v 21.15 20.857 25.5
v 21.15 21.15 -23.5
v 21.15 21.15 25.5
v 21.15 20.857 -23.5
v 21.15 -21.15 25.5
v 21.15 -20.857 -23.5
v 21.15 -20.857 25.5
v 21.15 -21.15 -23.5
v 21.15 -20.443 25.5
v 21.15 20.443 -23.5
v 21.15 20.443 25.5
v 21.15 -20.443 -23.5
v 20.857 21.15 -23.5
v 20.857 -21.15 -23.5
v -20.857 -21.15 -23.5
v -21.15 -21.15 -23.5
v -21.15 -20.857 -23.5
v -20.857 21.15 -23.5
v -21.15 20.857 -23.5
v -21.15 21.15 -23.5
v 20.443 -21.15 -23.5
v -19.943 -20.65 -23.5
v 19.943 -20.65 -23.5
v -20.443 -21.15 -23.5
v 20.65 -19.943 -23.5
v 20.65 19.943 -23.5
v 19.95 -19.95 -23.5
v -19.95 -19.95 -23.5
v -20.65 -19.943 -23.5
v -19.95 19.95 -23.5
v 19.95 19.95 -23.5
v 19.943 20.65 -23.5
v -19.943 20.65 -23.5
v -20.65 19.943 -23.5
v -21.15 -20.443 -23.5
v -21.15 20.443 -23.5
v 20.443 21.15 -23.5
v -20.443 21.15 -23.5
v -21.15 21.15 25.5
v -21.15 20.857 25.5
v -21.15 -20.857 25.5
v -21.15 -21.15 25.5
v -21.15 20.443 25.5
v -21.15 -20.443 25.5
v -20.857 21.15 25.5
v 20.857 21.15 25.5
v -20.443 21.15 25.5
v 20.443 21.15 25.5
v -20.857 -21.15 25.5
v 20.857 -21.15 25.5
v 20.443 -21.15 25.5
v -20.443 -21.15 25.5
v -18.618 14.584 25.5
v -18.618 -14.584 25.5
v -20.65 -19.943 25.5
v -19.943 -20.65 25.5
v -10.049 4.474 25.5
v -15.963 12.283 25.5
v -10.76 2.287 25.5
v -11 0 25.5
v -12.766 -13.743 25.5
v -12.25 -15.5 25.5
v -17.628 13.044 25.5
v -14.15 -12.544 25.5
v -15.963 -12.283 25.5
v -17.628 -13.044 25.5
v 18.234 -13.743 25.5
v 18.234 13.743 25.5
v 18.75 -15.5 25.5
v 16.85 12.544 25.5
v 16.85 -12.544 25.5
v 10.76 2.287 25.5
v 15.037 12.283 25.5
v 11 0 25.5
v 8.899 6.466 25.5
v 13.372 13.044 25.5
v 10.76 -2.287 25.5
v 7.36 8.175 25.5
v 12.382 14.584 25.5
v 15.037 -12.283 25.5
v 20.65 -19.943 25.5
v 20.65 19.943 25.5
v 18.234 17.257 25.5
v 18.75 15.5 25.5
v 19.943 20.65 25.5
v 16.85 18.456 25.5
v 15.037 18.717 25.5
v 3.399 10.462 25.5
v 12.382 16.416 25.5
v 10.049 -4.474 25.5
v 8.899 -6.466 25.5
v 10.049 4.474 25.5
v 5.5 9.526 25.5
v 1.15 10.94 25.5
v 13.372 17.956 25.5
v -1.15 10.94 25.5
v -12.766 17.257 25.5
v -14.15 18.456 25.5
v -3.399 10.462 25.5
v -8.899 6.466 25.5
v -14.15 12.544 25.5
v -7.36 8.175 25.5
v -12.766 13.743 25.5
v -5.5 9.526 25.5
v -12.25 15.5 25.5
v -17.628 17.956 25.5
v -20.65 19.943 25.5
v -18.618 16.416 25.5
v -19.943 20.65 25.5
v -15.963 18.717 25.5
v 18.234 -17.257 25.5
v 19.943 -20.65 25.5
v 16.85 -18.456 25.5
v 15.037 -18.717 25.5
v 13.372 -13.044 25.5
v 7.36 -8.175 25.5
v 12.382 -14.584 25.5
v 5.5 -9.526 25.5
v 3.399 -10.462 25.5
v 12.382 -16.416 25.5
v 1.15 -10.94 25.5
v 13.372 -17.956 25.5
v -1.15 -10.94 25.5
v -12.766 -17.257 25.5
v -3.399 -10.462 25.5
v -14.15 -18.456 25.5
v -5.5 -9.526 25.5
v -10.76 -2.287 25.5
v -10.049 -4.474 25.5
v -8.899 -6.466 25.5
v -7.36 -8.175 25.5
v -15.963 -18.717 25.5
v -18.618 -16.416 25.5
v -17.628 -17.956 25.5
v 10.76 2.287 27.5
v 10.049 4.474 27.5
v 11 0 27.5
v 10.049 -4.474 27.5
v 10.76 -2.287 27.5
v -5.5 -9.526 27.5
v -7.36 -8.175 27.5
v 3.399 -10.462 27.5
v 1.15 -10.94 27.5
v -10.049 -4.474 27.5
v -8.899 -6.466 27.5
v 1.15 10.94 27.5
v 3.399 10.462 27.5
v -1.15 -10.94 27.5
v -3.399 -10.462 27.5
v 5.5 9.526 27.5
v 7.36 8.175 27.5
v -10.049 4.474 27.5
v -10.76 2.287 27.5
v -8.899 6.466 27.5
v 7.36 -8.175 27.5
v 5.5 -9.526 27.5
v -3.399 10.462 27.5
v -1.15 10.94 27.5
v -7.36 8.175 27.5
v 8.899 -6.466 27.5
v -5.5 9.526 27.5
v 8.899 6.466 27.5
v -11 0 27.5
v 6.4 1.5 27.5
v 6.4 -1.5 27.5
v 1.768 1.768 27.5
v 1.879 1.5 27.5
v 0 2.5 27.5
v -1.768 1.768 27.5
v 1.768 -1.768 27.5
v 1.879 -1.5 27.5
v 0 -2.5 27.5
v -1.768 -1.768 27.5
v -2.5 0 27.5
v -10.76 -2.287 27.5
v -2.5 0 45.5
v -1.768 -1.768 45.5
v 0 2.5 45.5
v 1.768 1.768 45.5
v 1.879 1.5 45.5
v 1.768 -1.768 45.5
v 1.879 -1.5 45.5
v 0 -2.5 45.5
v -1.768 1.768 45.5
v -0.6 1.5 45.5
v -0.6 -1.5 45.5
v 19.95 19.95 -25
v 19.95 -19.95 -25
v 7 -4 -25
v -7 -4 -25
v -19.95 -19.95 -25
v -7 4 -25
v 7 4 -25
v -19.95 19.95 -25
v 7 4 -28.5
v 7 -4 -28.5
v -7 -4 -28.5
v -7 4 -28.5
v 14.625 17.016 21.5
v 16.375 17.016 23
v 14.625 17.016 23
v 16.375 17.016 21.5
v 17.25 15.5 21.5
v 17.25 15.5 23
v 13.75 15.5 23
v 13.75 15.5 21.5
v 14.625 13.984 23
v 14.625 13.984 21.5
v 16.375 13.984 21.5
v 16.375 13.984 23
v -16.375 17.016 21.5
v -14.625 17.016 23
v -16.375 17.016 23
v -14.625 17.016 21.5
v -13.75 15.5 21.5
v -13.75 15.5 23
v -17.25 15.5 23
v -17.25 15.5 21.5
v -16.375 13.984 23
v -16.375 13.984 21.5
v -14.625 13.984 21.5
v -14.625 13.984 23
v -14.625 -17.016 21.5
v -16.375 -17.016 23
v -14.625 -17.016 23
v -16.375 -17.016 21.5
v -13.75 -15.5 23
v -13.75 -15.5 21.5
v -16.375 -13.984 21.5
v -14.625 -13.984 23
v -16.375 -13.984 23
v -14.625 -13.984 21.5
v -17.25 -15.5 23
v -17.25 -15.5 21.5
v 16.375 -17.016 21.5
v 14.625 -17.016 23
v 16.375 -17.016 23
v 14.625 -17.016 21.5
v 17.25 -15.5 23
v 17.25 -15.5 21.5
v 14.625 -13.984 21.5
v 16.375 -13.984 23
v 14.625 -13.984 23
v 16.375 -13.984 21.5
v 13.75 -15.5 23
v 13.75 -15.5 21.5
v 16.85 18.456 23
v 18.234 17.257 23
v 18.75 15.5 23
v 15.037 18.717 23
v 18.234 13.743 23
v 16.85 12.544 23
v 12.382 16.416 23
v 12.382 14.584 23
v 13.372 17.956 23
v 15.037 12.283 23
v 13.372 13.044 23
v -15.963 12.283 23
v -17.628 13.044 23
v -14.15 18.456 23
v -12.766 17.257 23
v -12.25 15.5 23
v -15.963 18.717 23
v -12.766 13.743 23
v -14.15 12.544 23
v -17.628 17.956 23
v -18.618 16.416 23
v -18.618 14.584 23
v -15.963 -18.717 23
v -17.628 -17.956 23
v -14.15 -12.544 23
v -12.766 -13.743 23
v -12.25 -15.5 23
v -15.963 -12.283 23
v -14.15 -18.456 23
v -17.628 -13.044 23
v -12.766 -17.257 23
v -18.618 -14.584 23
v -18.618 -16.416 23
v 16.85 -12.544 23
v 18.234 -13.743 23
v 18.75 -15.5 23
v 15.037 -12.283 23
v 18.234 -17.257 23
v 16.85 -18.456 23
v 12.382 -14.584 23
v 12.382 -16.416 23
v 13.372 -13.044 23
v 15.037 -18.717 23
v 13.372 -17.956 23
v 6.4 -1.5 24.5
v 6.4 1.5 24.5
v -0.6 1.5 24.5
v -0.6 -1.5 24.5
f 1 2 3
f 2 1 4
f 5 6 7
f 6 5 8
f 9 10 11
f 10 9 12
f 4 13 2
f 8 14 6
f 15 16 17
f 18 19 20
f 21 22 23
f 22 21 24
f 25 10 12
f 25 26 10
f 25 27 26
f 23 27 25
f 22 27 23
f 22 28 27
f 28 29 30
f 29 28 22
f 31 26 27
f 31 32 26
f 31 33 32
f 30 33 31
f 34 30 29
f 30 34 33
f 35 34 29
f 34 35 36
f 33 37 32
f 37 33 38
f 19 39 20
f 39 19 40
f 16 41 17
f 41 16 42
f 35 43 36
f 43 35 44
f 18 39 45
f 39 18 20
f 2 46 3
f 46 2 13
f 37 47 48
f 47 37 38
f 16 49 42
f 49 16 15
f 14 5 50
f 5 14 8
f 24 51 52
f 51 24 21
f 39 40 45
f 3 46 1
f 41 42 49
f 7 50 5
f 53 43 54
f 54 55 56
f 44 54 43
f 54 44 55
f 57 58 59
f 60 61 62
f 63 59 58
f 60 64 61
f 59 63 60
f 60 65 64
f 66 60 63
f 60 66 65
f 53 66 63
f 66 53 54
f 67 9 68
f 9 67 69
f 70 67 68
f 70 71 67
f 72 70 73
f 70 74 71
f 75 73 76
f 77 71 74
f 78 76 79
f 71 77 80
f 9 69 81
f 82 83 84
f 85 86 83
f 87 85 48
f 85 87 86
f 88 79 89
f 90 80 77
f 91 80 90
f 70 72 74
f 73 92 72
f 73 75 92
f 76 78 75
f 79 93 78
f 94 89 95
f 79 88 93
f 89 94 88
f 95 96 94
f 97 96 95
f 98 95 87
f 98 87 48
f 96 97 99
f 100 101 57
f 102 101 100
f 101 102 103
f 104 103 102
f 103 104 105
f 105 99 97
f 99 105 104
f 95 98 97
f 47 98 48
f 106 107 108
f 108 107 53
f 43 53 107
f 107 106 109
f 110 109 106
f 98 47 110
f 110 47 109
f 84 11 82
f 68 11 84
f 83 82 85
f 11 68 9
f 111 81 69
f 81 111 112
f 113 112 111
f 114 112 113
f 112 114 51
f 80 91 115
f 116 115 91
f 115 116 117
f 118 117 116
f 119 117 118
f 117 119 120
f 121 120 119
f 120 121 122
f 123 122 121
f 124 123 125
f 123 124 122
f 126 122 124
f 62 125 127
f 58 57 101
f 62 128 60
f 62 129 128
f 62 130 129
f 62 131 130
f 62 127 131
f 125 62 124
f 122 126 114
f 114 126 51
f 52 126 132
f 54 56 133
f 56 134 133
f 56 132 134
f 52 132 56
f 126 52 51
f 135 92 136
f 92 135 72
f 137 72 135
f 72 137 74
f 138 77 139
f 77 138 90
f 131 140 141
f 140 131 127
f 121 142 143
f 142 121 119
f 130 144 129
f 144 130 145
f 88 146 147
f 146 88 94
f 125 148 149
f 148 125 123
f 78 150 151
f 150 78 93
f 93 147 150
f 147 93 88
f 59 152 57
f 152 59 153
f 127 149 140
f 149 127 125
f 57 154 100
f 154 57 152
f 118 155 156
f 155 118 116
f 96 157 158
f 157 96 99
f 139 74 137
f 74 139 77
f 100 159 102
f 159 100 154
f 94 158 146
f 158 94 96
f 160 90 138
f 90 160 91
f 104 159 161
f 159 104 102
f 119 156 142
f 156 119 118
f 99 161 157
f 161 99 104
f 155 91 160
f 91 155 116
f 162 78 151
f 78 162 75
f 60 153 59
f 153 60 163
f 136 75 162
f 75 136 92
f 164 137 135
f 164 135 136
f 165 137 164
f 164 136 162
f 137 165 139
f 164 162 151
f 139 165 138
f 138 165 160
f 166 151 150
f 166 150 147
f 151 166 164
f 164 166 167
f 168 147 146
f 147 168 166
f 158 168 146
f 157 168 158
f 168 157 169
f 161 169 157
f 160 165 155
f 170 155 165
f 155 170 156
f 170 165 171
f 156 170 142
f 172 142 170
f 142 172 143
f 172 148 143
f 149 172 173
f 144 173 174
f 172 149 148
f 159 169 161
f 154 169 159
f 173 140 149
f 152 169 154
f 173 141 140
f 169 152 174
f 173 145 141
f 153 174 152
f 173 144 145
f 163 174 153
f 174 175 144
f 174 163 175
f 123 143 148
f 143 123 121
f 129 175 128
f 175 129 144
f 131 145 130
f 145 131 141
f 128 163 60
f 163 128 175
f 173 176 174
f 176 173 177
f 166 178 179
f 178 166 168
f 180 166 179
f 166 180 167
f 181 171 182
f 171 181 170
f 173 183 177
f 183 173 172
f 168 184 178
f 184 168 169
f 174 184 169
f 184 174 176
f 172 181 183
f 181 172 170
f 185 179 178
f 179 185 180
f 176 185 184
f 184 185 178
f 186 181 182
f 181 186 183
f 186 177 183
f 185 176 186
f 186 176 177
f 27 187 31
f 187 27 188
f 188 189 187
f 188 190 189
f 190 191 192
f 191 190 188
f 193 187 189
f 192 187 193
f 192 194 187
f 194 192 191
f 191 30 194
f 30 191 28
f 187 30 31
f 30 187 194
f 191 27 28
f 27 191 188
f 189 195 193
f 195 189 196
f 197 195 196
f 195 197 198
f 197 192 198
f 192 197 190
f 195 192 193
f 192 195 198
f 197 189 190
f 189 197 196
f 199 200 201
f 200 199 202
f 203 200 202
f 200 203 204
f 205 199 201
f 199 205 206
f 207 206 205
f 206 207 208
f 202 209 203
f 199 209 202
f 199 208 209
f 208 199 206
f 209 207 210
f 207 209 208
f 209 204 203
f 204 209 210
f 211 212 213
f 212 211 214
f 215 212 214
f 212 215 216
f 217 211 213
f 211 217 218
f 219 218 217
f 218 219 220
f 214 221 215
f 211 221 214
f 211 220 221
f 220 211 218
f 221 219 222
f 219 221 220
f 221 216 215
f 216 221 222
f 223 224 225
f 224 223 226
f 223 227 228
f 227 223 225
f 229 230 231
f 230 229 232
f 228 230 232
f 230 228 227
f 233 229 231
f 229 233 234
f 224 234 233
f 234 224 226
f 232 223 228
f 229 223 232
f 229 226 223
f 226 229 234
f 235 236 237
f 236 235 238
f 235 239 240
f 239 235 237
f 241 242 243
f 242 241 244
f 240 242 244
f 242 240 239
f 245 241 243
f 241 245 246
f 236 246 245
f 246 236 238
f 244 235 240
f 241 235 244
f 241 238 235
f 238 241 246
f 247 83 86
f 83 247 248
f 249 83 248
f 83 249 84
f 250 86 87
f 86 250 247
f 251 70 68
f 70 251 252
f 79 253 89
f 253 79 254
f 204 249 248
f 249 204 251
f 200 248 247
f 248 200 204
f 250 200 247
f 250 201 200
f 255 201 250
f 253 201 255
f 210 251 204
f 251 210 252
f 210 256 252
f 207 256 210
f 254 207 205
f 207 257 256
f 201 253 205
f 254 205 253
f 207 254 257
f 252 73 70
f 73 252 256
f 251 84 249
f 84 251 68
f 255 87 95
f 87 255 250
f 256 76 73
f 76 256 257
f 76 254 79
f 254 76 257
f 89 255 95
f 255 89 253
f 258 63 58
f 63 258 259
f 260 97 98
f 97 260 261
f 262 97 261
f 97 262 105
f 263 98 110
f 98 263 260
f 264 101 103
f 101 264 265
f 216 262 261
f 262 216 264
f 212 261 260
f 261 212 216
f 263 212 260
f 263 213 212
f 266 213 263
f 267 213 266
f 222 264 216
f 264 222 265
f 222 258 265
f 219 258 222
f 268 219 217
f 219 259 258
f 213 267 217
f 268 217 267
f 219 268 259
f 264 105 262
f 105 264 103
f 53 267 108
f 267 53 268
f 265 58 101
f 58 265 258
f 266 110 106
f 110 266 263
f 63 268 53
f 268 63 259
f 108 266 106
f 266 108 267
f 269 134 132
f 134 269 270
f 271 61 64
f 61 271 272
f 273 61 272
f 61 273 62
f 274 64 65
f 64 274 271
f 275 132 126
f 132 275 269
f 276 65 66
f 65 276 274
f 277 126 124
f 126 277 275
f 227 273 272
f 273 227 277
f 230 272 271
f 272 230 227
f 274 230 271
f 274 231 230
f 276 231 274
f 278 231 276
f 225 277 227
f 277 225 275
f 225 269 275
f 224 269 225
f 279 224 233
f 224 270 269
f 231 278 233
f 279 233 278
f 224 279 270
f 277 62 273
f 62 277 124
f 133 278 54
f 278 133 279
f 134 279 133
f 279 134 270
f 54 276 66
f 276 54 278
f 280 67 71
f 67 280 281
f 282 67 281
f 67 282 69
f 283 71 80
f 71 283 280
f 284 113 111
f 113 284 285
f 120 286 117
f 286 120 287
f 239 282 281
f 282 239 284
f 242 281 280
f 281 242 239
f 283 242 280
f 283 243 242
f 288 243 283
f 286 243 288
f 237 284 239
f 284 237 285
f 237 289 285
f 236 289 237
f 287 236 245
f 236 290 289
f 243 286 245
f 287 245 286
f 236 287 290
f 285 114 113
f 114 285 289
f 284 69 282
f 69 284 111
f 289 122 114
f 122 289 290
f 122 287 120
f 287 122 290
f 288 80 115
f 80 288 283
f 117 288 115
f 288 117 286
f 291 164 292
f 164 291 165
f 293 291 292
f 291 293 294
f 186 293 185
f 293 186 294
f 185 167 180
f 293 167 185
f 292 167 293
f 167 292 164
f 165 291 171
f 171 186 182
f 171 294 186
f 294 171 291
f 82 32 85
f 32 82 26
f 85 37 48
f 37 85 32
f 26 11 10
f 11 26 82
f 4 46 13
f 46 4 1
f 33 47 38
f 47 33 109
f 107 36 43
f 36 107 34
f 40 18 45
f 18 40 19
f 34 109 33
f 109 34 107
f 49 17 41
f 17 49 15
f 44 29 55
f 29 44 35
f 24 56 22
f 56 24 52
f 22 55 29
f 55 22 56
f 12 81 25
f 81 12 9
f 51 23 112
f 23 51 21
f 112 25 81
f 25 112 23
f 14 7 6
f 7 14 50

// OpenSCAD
// Parameters
face_W = 42.3; //[21.15:84.6:0.1]
body_L = 47; //[23.5:94:0.1]
body_W = 42.3; //[21.15:84.6:0.1]
body_H = 42.3; //[21.15:84.6:0.1]
front_face_thk = 3; //[1.5:6:0.1]
shaft_D = 5; //[2.5:10:0.1]
shaft_L = 20; //[10:40:0.1]
pilot_D = 22; //[11:44:0.1]
pilot_H = 2; //[1:4:0.1]
mount_spacing = 31; //[15.5:62:0.1]
mount_hole_D = 3.5; //[2:7:0.1]
mount_counterbore_D = 6.5; //[3.5:13:0.1]
mount_counterbore_depth = 2; //[0.5:4:0.1]
rear_cap_thk = 2.5; //[1:5:0.1]
rear_cap_margin = 1.2; //[0.5:3:0.1]
connector_W = 14; //[7:28:0.1]
connector_H = 8; //[4:16:0.1]
connector_L = 6; //[3:12:0.1]
connector_offset_Y = 0; //[-10:10:0.1]
edge_chamfer = 1; //[0:2.5:0.1]
shaft_flat_depth = 0.6; //[0:1.5:0.05]
shaft_flat_width = 3; //[0:6:0.1]
overlap = 1; //[0.5:2:0.1]

// Base Shapes
module motor_body() {
  cube([body_W, body_H, body_L], center=true);
}

module front_face() {
  translate([0, 0, body_L/2 + front_face_thk/2 - overlap])
    cube([face_W, face_W, front_face_thk], center=true);
}

module front_pilot_boss() {
  translate([0, 0, body_L/2 + front_face_thk - overlap + pilot_H/2])
    cylinder(r=pilot_D/2, h=pilot_H, center=true);
}

module output_shaft() {
  translate([0, 0, body_L/2 + front_face_thk - overlap + shaft_L/2])
    cylinder(r=shaft_D/2, h=shaft_L, center=true);
}

module rear_cap_detail() {
  translate([0, 0, -body_L/2 - rear_cap_thk/2 + overlap])
    cube([body_W - 2*rear_cap_margin, body_H - 2*rear_cap_margin, rear_cap_thk], center=true);
}

module connector_bump() {
  translate([0, connector_offset_Y, -body_L/2 - connector_L/2 + overlap])
    cube([connector_W, connector_H, connector_L], center=true);
}

module mount_hole(x, y) {
  translate([x, y, body_L/2 + front_face_thk/2 - overlap])
    cylinder(r=mount_hole_D/2, h=front_face_thk + 2*overlap, center=true);
}

module mount_cb(x, y) {
  translate([x, y, body_L/2 + front_face_thk - overlap - mount_counterbore_depth/2])
    cylinder(r=mount_counterbore_D/2, h=mount_counterbore_depth + overlap, center=true);
}

module shaft_flat_cut() {
  translate([shaft_D/2 - shaft_flat_depth + overlap, 0, body_L/2 + front_face_thk - overlap + shaft_L/2])
    cube([shaft_D + 2*overlap, shaft_flat_width, shaft_L + 2*overlap], center=true);
}

module chamfer_cut_corner(x, y) {
  translate([x, y, 0])
    rotate([0, 0, 45])
    cube([edge_chamfer, edge_chamfer, body_L + 2*front_face_thk + 2*pilot_H + 2*shaft_L], center=true);
}

// Operations
module mounting_hole_pattern() {
  union() {
    mount_hole(mount_spacing/2, mount_spacing/2);
    mount_hole(-mount_spacing/2, mount_spacing/2);
    mount_hole(-mount_spacing/2, -mount_spacing/2);
    mount_hole(mount_spacing/2, -mount_spacing/2);
  }
}

module mounting_hole_counterbore() {
  union() {
    mount_cb(mount_spacing/2, mount_spacing/2);
    mount_cb(-mount_spacing/2, mount_spacing/2);
    mount_cb(-mount_spacing/2, -mount_spacing/2);
    mount_cb(mount_spacing/2, -mount_spacing/2);
  }
}

module motor_solid_raw() {
  union() {
    motor_body();
    front_face();
    front_pilot_boss();
    output_shaft();
    rear_cap_detail();
    connector_bump();
  }
}

module motor_with_holes() {
  difference() {
    motor_solid_raw();
    mounting_hole_pattern();
    mounting_hole_counterbore();
  }
}

module shaft_flat_or_key_optional_interface() {
  difference() {
    motor_with_holes();
    shaft_flat_cut();
  }
}

module chamfers_fillets() {
  difference() {
    shaft_flat_or_key_optional_interface();
    chamfer_cut_corner(body_W/2 - edge_chamfer/2, body_H/2 - edge_chamfer/2);
    chamfer_cut_corner(-body_W/2 + edge_chamfer/2, body_H/2 - edge_chamfer/2);
    chamfer_cut_corner(-body_W/2 + edge_chamfer/2, -body_H/2 + edge_chamfer/2);
    chamfer_cut_corner(body_W/2 - edge_chamfer/2, -body_H/2 + edge_chamfer/2);
  }
}

// Final Output
chamfers_fillets();
